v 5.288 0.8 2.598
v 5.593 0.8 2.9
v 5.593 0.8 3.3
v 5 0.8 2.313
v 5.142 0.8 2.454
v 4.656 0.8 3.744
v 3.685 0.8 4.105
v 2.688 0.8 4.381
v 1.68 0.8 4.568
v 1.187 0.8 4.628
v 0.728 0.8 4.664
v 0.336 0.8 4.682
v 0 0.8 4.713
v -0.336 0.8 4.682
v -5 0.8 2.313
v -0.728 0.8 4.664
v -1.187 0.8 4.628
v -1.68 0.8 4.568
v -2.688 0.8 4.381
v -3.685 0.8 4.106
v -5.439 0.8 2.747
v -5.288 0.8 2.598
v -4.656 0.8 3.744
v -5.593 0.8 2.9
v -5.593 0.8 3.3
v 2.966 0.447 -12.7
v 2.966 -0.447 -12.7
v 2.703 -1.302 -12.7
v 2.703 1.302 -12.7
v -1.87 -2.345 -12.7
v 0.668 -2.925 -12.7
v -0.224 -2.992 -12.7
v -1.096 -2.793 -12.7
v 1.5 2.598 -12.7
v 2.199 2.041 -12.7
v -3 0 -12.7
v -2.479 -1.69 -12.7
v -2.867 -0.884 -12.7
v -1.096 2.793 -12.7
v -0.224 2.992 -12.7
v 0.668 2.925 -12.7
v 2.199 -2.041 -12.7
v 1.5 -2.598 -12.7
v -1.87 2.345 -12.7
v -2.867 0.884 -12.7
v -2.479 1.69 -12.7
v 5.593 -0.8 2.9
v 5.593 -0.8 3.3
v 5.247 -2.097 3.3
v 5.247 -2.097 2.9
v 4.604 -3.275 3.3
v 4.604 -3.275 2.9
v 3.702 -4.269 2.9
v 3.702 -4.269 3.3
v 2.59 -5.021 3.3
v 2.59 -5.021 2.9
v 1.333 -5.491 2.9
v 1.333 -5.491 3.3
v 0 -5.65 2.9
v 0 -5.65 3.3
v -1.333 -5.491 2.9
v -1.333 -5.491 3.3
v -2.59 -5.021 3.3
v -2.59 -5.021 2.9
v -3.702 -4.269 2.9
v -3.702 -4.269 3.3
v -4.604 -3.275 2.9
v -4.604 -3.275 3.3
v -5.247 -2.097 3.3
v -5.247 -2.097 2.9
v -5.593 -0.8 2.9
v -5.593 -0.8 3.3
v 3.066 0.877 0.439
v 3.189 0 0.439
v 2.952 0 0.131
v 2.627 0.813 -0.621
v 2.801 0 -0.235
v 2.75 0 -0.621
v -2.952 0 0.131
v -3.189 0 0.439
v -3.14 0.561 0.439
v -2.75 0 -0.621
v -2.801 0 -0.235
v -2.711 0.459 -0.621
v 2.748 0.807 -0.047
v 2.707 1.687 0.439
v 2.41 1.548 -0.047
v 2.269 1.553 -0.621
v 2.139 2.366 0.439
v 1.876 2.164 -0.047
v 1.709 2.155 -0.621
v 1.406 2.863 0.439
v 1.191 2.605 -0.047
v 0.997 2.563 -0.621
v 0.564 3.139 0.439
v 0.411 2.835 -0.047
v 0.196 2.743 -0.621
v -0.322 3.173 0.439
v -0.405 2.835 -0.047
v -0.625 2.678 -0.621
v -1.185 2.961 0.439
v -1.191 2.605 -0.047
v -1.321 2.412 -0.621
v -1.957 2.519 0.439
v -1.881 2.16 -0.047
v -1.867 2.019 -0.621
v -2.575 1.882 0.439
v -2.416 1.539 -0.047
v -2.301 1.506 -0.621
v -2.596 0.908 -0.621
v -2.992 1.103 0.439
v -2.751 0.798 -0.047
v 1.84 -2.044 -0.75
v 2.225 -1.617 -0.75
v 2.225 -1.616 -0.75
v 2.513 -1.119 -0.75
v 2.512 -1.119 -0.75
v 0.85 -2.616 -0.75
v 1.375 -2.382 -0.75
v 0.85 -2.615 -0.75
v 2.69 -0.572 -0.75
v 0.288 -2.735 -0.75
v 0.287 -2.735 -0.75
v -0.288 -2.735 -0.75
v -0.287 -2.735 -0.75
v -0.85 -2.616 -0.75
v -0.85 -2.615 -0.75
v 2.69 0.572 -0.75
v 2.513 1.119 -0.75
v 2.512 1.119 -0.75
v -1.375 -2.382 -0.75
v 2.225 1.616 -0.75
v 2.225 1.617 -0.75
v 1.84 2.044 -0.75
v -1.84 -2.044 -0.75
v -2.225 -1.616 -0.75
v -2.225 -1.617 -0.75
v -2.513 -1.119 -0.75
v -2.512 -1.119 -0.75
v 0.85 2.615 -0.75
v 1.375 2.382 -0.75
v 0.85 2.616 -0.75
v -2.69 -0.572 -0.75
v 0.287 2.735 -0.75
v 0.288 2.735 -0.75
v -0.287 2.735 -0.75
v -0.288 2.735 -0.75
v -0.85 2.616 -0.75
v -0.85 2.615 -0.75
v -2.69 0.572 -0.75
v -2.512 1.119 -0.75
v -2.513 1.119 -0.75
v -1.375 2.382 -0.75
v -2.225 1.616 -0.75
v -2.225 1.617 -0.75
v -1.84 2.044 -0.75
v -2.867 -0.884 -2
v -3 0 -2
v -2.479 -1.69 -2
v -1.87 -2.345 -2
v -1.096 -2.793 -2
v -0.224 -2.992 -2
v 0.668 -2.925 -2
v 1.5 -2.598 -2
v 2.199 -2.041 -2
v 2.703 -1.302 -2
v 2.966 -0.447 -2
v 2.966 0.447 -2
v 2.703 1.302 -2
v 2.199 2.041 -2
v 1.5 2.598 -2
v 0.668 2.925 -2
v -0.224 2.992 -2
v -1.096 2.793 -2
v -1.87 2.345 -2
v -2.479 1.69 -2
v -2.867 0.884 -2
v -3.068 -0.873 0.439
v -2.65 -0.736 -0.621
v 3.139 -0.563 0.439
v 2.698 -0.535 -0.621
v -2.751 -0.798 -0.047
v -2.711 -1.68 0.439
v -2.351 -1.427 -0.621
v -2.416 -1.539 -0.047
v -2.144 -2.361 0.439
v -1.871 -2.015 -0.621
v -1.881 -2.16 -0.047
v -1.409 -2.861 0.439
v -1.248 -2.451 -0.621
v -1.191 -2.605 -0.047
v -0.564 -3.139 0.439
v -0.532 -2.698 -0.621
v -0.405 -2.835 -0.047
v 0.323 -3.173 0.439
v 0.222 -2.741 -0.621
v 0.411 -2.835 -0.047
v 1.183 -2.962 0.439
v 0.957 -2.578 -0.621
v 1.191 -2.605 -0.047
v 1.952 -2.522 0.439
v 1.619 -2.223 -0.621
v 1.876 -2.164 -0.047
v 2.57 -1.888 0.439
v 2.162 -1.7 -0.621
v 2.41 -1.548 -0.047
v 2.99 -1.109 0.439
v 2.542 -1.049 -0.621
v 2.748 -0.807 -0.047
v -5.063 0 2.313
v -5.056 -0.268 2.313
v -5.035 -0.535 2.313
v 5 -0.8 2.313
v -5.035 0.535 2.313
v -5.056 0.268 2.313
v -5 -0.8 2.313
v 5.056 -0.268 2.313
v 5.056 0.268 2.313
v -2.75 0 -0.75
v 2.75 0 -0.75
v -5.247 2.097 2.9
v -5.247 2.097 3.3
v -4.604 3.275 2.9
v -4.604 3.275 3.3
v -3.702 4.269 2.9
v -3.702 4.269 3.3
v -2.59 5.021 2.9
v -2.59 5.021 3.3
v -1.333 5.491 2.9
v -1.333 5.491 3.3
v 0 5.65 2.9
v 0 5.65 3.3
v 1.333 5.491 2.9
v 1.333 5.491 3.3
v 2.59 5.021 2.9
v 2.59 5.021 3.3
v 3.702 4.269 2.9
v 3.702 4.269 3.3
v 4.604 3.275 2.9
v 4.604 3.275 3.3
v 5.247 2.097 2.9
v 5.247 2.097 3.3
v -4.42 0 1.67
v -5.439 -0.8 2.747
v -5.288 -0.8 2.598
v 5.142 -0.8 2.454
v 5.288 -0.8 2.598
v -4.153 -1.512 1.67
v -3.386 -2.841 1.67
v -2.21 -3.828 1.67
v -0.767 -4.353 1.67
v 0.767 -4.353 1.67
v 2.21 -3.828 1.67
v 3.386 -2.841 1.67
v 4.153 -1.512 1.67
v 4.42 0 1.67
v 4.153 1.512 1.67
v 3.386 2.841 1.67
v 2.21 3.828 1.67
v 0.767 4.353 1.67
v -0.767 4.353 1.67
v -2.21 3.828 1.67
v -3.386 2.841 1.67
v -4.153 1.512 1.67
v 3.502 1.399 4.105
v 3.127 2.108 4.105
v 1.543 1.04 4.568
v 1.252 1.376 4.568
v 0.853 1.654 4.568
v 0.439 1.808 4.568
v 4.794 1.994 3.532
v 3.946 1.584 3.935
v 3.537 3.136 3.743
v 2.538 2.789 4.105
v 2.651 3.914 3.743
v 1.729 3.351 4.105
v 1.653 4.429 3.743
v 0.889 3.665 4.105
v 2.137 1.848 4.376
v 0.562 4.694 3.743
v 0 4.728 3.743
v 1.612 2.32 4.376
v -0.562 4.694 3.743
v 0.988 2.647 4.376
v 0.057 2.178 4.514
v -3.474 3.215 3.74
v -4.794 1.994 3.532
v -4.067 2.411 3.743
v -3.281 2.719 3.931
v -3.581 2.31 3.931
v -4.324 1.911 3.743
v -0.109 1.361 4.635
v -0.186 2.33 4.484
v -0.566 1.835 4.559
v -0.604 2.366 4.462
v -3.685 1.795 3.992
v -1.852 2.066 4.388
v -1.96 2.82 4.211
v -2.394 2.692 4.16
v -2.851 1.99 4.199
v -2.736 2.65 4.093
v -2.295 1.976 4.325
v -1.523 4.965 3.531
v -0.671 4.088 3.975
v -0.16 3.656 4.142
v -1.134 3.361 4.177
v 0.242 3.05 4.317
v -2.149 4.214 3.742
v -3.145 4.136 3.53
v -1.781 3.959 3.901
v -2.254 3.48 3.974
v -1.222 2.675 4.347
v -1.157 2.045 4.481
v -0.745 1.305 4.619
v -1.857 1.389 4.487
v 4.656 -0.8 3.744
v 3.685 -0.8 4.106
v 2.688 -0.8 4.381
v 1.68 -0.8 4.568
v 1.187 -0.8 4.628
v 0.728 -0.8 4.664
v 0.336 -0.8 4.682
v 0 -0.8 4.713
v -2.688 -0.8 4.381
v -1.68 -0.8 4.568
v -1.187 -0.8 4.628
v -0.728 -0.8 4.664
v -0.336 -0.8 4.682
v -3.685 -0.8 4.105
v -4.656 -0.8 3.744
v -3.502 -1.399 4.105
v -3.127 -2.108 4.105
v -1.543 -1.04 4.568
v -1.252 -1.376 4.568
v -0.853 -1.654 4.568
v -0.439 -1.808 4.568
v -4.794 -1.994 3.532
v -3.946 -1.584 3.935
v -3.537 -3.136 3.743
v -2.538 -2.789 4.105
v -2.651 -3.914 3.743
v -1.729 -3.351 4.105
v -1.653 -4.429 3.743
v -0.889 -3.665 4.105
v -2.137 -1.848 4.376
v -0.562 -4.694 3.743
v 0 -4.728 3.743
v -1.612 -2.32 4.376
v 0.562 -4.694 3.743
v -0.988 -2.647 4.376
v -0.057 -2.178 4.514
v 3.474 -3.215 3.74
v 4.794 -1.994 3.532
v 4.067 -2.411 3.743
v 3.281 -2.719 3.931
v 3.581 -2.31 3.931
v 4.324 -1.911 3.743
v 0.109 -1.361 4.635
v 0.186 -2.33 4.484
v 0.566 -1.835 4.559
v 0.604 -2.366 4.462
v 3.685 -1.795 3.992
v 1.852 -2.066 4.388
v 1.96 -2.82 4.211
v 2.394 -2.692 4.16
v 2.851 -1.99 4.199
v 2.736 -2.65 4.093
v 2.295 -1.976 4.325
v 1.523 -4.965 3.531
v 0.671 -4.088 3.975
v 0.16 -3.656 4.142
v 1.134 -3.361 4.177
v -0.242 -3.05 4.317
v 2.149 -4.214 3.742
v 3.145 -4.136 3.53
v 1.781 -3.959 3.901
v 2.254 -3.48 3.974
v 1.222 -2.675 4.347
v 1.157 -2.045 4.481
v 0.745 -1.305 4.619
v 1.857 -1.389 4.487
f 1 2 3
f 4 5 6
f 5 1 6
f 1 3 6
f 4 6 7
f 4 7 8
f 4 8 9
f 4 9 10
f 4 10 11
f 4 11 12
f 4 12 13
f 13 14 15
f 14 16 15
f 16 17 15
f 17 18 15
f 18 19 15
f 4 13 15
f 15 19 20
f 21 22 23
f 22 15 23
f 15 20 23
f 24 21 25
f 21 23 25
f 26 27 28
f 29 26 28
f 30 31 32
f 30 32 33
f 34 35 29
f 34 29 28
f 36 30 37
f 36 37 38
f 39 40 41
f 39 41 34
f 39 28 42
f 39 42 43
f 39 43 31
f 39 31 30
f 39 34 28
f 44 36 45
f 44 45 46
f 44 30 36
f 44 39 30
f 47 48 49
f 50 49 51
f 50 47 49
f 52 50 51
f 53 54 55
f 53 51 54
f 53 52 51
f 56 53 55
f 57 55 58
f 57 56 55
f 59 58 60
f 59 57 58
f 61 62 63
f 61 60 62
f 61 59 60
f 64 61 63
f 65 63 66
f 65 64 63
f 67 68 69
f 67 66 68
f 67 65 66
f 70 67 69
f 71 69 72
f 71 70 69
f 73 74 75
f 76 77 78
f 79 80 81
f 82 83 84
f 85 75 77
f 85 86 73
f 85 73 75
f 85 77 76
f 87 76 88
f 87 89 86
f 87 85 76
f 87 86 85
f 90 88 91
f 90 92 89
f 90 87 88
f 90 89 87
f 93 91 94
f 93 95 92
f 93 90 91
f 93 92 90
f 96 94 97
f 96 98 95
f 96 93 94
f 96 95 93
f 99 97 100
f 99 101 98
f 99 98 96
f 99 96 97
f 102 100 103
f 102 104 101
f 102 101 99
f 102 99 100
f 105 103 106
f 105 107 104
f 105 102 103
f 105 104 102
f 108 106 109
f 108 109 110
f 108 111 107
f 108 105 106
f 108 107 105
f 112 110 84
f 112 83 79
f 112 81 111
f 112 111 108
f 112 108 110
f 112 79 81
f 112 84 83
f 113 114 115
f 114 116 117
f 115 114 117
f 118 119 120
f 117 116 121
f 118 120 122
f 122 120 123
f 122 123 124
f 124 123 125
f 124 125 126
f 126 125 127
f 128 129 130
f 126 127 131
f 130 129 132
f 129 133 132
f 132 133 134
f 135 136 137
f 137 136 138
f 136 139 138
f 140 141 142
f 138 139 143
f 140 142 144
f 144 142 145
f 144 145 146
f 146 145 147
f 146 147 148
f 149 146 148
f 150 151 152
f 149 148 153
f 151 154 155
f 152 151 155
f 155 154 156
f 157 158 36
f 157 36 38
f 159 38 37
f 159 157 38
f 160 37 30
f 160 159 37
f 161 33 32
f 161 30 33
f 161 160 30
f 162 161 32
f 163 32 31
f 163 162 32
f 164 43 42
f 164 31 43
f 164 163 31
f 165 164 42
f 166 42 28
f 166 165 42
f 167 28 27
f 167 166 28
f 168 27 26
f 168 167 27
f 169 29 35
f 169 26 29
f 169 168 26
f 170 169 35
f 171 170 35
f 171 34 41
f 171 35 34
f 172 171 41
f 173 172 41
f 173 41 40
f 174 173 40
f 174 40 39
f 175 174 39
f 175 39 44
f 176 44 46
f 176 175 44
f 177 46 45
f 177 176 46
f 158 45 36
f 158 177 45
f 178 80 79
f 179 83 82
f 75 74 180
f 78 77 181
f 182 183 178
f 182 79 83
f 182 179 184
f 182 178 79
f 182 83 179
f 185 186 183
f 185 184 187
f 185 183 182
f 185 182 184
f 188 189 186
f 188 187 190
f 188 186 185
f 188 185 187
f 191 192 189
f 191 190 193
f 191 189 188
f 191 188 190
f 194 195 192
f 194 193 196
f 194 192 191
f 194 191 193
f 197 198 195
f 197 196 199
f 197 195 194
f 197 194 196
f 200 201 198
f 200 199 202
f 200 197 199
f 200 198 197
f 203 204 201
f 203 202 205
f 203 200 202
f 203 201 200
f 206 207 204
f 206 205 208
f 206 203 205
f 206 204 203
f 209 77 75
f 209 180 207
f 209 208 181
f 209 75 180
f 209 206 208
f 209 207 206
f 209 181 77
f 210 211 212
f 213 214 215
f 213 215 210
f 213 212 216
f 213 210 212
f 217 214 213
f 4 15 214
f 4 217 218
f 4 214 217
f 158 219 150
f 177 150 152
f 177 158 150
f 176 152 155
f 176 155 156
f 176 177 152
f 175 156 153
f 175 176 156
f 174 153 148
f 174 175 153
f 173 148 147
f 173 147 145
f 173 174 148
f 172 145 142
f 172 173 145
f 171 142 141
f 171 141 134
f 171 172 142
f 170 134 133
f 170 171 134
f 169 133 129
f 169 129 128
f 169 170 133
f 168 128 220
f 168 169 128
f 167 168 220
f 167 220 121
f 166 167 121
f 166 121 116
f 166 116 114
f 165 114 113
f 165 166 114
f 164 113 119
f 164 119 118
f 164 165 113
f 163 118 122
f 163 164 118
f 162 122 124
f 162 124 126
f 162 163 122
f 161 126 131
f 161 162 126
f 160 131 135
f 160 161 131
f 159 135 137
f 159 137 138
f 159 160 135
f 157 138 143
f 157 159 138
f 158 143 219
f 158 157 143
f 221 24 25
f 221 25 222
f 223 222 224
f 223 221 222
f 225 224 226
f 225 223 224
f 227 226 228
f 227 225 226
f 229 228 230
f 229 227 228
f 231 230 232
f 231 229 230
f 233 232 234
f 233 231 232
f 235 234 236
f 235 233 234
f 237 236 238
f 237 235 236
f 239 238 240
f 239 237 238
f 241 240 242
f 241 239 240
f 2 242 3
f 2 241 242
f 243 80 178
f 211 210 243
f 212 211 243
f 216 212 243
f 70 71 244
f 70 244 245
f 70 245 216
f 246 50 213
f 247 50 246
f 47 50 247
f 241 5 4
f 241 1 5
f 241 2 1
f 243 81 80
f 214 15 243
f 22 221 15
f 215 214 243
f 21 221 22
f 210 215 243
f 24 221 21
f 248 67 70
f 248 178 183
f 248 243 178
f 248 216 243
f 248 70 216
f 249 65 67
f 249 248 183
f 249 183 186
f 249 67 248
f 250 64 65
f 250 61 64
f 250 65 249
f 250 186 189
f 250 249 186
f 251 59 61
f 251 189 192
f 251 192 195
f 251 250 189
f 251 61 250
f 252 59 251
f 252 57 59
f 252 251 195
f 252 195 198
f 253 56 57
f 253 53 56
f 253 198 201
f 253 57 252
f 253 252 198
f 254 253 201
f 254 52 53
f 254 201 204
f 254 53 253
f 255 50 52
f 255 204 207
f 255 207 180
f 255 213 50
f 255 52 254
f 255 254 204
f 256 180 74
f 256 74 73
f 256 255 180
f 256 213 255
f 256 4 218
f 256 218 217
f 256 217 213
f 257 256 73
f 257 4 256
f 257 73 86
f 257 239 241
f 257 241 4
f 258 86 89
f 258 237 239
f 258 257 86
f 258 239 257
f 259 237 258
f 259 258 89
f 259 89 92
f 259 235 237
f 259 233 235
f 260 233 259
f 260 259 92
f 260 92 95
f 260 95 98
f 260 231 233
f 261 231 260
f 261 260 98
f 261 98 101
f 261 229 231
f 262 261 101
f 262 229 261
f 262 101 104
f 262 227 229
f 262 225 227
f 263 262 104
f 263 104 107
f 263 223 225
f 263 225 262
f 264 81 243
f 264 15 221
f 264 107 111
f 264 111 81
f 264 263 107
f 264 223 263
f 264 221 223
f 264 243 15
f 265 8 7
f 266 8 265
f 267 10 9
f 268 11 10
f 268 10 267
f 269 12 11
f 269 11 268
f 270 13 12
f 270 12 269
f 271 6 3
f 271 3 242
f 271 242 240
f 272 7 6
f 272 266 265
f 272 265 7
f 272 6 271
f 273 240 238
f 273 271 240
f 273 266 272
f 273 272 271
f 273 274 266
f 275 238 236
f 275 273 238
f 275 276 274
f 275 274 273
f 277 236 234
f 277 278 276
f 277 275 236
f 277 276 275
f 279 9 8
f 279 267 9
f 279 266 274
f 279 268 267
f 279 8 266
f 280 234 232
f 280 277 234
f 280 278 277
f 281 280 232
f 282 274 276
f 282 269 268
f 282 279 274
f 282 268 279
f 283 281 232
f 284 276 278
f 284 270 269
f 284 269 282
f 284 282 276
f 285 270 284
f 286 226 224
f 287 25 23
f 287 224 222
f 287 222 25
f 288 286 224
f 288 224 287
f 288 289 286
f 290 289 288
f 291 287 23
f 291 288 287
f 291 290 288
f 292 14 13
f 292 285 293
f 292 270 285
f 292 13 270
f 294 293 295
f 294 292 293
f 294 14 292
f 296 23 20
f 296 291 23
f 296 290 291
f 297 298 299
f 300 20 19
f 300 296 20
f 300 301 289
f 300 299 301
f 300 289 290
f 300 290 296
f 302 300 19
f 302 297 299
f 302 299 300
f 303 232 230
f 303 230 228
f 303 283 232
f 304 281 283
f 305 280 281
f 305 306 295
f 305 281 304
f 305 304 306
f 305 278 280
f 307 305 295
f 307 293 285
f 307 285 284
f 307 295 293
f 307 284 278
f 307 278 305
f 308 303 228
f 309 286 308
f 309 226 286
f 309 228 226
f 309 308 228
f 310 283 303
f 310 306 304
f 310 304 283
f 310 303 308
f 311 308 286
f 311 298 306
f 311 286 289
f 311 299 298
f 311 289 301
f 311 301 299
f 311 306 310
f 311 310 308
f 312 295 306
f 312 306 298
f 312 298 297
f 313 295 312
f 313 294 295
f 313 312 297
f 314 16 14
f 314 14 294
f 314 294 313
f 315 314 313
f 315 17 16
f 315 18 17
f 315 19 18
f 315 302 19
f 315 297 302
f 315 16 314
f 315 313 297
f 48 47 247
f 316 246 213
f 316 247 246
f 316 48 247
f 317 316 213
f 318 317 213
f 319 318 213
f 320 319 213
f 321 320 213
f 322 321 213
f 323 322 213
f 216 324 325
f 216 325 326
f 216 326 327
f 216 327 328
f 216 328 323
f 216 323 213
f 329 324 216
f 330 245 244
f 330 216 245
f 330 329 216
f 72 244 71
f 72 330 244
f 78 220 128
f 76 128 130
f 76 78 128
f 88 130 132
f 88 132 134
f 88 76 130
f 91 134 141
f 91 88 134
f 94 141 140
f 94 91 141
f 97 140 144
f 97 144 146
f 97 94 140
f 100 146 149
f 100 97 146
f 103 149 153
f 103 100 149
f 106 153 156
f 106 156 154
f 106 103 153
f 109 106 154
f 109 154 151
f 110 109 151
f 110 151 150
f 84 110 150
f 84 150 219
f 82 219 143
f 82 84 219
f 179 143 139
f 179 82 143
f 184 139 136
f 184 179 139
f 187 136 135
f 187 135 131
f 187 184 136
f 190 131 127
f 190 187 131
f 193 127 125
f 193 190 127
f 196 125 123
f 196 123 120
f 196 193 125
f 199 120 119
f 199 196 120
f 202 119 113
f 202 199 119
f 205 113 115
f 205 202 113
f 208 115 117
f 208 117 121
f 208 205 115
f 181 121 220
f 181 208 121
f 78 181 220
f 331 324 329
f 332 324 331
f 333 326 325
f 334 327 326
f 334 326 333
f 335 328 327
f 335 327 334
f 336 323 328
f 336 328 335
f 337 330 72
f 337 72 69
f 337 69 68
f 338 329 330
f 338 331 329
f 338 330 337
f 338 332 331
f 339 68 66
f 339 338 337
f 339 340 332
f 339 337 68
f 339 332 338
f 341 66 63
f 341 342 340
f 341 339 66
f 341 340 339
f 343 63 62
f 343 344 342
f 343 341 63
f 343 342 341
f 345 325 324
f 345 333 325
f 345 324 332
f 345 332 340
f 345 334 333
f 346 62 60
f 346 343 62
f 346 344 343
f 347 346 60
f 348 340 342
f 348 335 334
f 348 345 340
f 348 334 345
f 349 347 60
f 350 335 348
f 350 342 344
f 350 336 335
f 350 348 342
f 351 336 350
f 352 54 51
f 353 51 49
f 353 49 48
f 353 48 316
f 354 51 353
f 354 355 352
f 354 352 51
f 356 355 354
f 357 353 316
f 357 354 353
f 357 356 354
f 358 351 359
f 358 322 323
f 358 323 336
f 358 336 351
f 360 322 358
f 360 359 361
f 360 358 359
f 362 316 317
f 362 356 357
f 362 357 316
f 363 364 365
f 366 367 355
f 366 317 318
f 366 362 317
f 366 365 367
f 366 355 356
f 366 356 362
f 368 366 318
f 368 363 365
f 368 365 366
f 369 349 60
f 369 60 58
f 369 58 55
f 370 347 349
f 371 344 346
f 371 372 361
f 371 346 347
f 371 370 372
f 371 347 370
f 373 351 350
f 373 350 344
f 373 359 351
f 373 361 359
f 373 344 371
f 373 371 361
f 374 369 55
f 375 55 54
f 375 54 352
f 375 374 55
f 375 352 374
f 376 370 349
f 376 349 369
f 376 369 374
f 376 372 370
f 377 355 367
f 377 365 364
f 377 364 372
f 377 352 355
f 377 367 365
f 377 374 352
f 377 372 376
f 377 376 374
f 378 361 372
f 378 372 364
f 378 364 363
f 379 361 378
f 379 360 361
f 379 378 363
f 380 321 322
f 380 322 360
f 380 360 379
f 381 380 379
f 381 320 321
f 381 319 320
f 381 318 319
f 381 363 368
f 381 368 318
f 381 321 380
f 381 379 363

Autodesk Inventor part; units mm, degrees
ref_plane "WorkPlane11" through (0, 0, 0) normal (0, 0, 1) x (1, 0, 0)
ref_plane "Work Plane2" through (0, 0, -5.7) normal (0, 0, 1) x (1, 0, 0)
ref_plane "WorkPlane9" through (0, 0, 8.3) normal (0, 0, 1) x (1, 0, 0)
sketch "Sketch1" plane through (0, 0, 0) normal (0, 0, 1) x (1, 0, 0)
  point P0 (0, 0)
sketch "Sketch2" plane through (0, 0, 0) normal (0, 0, 1) x (1, 0, 0)
  circle A0 centre (0, 0) radius 2.75
  dimension "d2" = 5.5
extrude "Extrusion1" add sketch "Sketch2" against normal blind 0.75
sketch "Sketch3" plane through (0, 0, -0.75) normal (0, 0, -1) x (-1, 0, 0)
  circle A0 centre (0, 0) radius 3
  circle A1 centre (0, 0) radius 2.75 construction
  dimension "d8" = 6
extrude "Extrusion2" add sketch "Sketch3" along normal blind 11.95
sketch "Sketch4" plane through (0, 0, 0) normal (0, 0, 1) x (1, 0, 0)
  circle A0 centre (0, 0) radius 5.65
  circle A1 centre (0, 0) radius 2.75 construction
  dimension "d12" = 11.3
extrude "Extrusion3" add sketch "Sketch4" along normal blind 3.3
sketch "Sketch5" plane through (0, 0, 0) normal (0, 1, 0) x (-1, 0, 0)
  line L0 (5.65, 0) -> (2.75, 0)
  line L1 (5.65, 2.9) -> (5.65, 0)
  line L2 (2.75, 0) -> (5.65, 2.9)
  line L3 (-5.65, 0) -> (5.65, 0) construction
  line L4 (0, -7.6493) -> (0, 5.8993)
  line L5 (0, -10.359) -> (0, 8.609) projected
  line L6 (5.65, 0) -> (5.65, 3.3) projected
  line L7 (-4.75, 0) -> (4.75, 0) projected
  line L8 (2.75, 0) -> (2.75, -0.75) projected
  dimension "d17" = 45
revolve "Revolution1" cut sketch "Sketch5" angle 360 about axis through (0, 0, -7.6493) along (0, 0, 1)
sketch "Sketch6" plane through (0, 0, 0) normal (0, 1, 0) x (-1, 0, 0)
  line L0 (0, 3.3) -> (0, 4.7133)
  line L1 (0, 3.3) -> (5.65, 3.3)
  arc A0 (5.65, 3.3) -> (0, 4.7133) centre (0, -7.2867) ccw
  line L2 (-5.65, 3.3) -> (5.65, 3.3) construction
  line L3 (0, -7.6493) -> (0, 5.8993)
  line L4 (0, -10.359) -> (0, 8.609) projected
  line L5 (5.65, 2.9) -> (5.65, 3.3) projected
  arc A1 (0, 4.7133) -> (-5.65, 3.3) centre (0, -7.2867) ccw
  dimension "d20" = 12
  dimension "d24" = 5.65
revolve "Revolution2" add sketch "Sketch6" angle 360 about axis through (0, 0, -7.6493) along (0, 0, 1)
fillet "Fillet1" radius 1.5 2 edges at (0, 2.75, 0) (0, -2.75, 0)
chamfer "Chamfer1" distance 1.25 distance2 0.25 1 edges at (3, 0, -0.75) measured on face at (-2.9903, -0.2414, -8.7167)
sketch "Sketch8" plane through (0, 0, 0) normal (0, 1, 0) x (-1, 0, 0)
  line L0 (-5.65, 4.7133) -> (5.65, 4.7133)
  line L1 (5.65, 4.7133) -> (5.65, 2.3133)
  line L2 (5.65, 2.3133) -> (-5.65, 2.3133)
  line L3 (-5.65, 2.3133) -> (-5.65, 4.7133)
  arc A0 (5.65, 3.3) -> (-5.65, 3.3) centre (0, -7.2867) ccw projected
  line L4 (-5.65, 2.9) -> (-5.65, 3.3) projected
  line L5 (5.65, 2.9) -> (5.65, 3.3) projected
  dimension "msp_d31" = 2.4
extrude "Extrusion4" cut sketch "Sketch8" against normal mid plane 1.6
thread "Thread1" size "M6x1" class "6g" standard "ISO Metric profile" full length
ref_plane "MSC_PF1" through (0, 0, 0) normal (1, 0, 0) x (0, 1, 0)
ref_plane "MSC_PT1" through (-5.65, 0, 2.9) normal (0, 0, -1) x (-1, 0, 0)
equation "\"d28\" = r"
equation "\"d29\" = msp_x"
equation "\"d30\" = 0.25 * PTC"
equation "\"d3\" = -msp_x + ParA"
equation "\"d8\" = NND"
equation "\"d9\" = msp_x - ParK + NLG - ParA"
equation "\"d12\" = Dk"
equation "\"d13\" = ParK"
equation "\"msp_d31\" = ParT"
equation "\"msp_d32\" = ParN"
equation "\"d2\" = 0.5 * PTC + msp_mdtds"
equation "\"d20\" = rf"
equation "\"d24\" = 0.5 * Dk"
equation "\"PTC\" = 1"
equation "\"NND\" = 6"
equation "\"msp_x\" = 1.25 * PTC"
equation "\"NLG\" = 16"
equation "\"msp_mdtds\" = NND - PTC"
equation "\"ParK\" = 3.3"
equation "\"ParN\" = 1.6"
equation "\"ParT\" = 2.4"
equation "\"r\" = 1.5"
equation "\"prf_c\" = 0"
equation "\"ParA\" = 2"
equation "\"Dk\" = 11.3"
equation "\"rf\" = 12"
equation "\"ParF\" = 1.4"
equation "\"THREADDIA\" = NND"
equation "\"PG\" = 1.2345"
equation "\"TEMPLATE\" = 1.2345"
properties part number "ISO 2010 - M6x16" material "Stainless Steel, 440C"
